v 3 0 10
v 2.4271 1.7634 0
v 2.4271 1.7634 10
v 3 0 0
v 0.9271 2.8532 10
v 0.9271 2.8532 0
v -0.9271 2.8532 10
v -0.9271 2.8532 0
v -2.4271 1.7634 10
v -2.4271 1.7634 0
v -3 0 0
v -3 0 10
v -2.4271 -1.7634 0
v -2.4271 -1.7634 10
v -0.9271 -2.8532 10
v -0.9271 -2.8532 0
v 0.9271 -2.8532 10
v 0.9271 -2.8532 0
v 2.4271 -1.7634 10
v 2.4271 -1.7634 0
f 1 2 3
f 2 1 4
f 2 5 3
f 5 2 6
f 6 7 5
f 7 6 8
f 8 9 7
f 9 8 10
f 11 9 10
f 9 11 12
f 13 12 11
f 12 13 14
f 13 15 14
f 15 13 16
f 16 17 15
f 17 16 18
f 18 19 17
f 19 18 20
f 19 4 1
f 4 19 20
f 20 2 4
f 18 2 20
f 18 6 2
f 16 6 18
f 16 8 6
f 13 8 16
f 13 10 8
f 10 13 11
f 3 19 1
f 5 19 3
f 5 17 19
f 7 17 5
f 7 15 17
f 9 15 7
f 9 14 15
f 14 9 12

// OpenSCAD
// Generated by scadwright. Do not hand-edit —
// edit the Python source and regenerate.

cylinder(h=10, r=3, center=false);
